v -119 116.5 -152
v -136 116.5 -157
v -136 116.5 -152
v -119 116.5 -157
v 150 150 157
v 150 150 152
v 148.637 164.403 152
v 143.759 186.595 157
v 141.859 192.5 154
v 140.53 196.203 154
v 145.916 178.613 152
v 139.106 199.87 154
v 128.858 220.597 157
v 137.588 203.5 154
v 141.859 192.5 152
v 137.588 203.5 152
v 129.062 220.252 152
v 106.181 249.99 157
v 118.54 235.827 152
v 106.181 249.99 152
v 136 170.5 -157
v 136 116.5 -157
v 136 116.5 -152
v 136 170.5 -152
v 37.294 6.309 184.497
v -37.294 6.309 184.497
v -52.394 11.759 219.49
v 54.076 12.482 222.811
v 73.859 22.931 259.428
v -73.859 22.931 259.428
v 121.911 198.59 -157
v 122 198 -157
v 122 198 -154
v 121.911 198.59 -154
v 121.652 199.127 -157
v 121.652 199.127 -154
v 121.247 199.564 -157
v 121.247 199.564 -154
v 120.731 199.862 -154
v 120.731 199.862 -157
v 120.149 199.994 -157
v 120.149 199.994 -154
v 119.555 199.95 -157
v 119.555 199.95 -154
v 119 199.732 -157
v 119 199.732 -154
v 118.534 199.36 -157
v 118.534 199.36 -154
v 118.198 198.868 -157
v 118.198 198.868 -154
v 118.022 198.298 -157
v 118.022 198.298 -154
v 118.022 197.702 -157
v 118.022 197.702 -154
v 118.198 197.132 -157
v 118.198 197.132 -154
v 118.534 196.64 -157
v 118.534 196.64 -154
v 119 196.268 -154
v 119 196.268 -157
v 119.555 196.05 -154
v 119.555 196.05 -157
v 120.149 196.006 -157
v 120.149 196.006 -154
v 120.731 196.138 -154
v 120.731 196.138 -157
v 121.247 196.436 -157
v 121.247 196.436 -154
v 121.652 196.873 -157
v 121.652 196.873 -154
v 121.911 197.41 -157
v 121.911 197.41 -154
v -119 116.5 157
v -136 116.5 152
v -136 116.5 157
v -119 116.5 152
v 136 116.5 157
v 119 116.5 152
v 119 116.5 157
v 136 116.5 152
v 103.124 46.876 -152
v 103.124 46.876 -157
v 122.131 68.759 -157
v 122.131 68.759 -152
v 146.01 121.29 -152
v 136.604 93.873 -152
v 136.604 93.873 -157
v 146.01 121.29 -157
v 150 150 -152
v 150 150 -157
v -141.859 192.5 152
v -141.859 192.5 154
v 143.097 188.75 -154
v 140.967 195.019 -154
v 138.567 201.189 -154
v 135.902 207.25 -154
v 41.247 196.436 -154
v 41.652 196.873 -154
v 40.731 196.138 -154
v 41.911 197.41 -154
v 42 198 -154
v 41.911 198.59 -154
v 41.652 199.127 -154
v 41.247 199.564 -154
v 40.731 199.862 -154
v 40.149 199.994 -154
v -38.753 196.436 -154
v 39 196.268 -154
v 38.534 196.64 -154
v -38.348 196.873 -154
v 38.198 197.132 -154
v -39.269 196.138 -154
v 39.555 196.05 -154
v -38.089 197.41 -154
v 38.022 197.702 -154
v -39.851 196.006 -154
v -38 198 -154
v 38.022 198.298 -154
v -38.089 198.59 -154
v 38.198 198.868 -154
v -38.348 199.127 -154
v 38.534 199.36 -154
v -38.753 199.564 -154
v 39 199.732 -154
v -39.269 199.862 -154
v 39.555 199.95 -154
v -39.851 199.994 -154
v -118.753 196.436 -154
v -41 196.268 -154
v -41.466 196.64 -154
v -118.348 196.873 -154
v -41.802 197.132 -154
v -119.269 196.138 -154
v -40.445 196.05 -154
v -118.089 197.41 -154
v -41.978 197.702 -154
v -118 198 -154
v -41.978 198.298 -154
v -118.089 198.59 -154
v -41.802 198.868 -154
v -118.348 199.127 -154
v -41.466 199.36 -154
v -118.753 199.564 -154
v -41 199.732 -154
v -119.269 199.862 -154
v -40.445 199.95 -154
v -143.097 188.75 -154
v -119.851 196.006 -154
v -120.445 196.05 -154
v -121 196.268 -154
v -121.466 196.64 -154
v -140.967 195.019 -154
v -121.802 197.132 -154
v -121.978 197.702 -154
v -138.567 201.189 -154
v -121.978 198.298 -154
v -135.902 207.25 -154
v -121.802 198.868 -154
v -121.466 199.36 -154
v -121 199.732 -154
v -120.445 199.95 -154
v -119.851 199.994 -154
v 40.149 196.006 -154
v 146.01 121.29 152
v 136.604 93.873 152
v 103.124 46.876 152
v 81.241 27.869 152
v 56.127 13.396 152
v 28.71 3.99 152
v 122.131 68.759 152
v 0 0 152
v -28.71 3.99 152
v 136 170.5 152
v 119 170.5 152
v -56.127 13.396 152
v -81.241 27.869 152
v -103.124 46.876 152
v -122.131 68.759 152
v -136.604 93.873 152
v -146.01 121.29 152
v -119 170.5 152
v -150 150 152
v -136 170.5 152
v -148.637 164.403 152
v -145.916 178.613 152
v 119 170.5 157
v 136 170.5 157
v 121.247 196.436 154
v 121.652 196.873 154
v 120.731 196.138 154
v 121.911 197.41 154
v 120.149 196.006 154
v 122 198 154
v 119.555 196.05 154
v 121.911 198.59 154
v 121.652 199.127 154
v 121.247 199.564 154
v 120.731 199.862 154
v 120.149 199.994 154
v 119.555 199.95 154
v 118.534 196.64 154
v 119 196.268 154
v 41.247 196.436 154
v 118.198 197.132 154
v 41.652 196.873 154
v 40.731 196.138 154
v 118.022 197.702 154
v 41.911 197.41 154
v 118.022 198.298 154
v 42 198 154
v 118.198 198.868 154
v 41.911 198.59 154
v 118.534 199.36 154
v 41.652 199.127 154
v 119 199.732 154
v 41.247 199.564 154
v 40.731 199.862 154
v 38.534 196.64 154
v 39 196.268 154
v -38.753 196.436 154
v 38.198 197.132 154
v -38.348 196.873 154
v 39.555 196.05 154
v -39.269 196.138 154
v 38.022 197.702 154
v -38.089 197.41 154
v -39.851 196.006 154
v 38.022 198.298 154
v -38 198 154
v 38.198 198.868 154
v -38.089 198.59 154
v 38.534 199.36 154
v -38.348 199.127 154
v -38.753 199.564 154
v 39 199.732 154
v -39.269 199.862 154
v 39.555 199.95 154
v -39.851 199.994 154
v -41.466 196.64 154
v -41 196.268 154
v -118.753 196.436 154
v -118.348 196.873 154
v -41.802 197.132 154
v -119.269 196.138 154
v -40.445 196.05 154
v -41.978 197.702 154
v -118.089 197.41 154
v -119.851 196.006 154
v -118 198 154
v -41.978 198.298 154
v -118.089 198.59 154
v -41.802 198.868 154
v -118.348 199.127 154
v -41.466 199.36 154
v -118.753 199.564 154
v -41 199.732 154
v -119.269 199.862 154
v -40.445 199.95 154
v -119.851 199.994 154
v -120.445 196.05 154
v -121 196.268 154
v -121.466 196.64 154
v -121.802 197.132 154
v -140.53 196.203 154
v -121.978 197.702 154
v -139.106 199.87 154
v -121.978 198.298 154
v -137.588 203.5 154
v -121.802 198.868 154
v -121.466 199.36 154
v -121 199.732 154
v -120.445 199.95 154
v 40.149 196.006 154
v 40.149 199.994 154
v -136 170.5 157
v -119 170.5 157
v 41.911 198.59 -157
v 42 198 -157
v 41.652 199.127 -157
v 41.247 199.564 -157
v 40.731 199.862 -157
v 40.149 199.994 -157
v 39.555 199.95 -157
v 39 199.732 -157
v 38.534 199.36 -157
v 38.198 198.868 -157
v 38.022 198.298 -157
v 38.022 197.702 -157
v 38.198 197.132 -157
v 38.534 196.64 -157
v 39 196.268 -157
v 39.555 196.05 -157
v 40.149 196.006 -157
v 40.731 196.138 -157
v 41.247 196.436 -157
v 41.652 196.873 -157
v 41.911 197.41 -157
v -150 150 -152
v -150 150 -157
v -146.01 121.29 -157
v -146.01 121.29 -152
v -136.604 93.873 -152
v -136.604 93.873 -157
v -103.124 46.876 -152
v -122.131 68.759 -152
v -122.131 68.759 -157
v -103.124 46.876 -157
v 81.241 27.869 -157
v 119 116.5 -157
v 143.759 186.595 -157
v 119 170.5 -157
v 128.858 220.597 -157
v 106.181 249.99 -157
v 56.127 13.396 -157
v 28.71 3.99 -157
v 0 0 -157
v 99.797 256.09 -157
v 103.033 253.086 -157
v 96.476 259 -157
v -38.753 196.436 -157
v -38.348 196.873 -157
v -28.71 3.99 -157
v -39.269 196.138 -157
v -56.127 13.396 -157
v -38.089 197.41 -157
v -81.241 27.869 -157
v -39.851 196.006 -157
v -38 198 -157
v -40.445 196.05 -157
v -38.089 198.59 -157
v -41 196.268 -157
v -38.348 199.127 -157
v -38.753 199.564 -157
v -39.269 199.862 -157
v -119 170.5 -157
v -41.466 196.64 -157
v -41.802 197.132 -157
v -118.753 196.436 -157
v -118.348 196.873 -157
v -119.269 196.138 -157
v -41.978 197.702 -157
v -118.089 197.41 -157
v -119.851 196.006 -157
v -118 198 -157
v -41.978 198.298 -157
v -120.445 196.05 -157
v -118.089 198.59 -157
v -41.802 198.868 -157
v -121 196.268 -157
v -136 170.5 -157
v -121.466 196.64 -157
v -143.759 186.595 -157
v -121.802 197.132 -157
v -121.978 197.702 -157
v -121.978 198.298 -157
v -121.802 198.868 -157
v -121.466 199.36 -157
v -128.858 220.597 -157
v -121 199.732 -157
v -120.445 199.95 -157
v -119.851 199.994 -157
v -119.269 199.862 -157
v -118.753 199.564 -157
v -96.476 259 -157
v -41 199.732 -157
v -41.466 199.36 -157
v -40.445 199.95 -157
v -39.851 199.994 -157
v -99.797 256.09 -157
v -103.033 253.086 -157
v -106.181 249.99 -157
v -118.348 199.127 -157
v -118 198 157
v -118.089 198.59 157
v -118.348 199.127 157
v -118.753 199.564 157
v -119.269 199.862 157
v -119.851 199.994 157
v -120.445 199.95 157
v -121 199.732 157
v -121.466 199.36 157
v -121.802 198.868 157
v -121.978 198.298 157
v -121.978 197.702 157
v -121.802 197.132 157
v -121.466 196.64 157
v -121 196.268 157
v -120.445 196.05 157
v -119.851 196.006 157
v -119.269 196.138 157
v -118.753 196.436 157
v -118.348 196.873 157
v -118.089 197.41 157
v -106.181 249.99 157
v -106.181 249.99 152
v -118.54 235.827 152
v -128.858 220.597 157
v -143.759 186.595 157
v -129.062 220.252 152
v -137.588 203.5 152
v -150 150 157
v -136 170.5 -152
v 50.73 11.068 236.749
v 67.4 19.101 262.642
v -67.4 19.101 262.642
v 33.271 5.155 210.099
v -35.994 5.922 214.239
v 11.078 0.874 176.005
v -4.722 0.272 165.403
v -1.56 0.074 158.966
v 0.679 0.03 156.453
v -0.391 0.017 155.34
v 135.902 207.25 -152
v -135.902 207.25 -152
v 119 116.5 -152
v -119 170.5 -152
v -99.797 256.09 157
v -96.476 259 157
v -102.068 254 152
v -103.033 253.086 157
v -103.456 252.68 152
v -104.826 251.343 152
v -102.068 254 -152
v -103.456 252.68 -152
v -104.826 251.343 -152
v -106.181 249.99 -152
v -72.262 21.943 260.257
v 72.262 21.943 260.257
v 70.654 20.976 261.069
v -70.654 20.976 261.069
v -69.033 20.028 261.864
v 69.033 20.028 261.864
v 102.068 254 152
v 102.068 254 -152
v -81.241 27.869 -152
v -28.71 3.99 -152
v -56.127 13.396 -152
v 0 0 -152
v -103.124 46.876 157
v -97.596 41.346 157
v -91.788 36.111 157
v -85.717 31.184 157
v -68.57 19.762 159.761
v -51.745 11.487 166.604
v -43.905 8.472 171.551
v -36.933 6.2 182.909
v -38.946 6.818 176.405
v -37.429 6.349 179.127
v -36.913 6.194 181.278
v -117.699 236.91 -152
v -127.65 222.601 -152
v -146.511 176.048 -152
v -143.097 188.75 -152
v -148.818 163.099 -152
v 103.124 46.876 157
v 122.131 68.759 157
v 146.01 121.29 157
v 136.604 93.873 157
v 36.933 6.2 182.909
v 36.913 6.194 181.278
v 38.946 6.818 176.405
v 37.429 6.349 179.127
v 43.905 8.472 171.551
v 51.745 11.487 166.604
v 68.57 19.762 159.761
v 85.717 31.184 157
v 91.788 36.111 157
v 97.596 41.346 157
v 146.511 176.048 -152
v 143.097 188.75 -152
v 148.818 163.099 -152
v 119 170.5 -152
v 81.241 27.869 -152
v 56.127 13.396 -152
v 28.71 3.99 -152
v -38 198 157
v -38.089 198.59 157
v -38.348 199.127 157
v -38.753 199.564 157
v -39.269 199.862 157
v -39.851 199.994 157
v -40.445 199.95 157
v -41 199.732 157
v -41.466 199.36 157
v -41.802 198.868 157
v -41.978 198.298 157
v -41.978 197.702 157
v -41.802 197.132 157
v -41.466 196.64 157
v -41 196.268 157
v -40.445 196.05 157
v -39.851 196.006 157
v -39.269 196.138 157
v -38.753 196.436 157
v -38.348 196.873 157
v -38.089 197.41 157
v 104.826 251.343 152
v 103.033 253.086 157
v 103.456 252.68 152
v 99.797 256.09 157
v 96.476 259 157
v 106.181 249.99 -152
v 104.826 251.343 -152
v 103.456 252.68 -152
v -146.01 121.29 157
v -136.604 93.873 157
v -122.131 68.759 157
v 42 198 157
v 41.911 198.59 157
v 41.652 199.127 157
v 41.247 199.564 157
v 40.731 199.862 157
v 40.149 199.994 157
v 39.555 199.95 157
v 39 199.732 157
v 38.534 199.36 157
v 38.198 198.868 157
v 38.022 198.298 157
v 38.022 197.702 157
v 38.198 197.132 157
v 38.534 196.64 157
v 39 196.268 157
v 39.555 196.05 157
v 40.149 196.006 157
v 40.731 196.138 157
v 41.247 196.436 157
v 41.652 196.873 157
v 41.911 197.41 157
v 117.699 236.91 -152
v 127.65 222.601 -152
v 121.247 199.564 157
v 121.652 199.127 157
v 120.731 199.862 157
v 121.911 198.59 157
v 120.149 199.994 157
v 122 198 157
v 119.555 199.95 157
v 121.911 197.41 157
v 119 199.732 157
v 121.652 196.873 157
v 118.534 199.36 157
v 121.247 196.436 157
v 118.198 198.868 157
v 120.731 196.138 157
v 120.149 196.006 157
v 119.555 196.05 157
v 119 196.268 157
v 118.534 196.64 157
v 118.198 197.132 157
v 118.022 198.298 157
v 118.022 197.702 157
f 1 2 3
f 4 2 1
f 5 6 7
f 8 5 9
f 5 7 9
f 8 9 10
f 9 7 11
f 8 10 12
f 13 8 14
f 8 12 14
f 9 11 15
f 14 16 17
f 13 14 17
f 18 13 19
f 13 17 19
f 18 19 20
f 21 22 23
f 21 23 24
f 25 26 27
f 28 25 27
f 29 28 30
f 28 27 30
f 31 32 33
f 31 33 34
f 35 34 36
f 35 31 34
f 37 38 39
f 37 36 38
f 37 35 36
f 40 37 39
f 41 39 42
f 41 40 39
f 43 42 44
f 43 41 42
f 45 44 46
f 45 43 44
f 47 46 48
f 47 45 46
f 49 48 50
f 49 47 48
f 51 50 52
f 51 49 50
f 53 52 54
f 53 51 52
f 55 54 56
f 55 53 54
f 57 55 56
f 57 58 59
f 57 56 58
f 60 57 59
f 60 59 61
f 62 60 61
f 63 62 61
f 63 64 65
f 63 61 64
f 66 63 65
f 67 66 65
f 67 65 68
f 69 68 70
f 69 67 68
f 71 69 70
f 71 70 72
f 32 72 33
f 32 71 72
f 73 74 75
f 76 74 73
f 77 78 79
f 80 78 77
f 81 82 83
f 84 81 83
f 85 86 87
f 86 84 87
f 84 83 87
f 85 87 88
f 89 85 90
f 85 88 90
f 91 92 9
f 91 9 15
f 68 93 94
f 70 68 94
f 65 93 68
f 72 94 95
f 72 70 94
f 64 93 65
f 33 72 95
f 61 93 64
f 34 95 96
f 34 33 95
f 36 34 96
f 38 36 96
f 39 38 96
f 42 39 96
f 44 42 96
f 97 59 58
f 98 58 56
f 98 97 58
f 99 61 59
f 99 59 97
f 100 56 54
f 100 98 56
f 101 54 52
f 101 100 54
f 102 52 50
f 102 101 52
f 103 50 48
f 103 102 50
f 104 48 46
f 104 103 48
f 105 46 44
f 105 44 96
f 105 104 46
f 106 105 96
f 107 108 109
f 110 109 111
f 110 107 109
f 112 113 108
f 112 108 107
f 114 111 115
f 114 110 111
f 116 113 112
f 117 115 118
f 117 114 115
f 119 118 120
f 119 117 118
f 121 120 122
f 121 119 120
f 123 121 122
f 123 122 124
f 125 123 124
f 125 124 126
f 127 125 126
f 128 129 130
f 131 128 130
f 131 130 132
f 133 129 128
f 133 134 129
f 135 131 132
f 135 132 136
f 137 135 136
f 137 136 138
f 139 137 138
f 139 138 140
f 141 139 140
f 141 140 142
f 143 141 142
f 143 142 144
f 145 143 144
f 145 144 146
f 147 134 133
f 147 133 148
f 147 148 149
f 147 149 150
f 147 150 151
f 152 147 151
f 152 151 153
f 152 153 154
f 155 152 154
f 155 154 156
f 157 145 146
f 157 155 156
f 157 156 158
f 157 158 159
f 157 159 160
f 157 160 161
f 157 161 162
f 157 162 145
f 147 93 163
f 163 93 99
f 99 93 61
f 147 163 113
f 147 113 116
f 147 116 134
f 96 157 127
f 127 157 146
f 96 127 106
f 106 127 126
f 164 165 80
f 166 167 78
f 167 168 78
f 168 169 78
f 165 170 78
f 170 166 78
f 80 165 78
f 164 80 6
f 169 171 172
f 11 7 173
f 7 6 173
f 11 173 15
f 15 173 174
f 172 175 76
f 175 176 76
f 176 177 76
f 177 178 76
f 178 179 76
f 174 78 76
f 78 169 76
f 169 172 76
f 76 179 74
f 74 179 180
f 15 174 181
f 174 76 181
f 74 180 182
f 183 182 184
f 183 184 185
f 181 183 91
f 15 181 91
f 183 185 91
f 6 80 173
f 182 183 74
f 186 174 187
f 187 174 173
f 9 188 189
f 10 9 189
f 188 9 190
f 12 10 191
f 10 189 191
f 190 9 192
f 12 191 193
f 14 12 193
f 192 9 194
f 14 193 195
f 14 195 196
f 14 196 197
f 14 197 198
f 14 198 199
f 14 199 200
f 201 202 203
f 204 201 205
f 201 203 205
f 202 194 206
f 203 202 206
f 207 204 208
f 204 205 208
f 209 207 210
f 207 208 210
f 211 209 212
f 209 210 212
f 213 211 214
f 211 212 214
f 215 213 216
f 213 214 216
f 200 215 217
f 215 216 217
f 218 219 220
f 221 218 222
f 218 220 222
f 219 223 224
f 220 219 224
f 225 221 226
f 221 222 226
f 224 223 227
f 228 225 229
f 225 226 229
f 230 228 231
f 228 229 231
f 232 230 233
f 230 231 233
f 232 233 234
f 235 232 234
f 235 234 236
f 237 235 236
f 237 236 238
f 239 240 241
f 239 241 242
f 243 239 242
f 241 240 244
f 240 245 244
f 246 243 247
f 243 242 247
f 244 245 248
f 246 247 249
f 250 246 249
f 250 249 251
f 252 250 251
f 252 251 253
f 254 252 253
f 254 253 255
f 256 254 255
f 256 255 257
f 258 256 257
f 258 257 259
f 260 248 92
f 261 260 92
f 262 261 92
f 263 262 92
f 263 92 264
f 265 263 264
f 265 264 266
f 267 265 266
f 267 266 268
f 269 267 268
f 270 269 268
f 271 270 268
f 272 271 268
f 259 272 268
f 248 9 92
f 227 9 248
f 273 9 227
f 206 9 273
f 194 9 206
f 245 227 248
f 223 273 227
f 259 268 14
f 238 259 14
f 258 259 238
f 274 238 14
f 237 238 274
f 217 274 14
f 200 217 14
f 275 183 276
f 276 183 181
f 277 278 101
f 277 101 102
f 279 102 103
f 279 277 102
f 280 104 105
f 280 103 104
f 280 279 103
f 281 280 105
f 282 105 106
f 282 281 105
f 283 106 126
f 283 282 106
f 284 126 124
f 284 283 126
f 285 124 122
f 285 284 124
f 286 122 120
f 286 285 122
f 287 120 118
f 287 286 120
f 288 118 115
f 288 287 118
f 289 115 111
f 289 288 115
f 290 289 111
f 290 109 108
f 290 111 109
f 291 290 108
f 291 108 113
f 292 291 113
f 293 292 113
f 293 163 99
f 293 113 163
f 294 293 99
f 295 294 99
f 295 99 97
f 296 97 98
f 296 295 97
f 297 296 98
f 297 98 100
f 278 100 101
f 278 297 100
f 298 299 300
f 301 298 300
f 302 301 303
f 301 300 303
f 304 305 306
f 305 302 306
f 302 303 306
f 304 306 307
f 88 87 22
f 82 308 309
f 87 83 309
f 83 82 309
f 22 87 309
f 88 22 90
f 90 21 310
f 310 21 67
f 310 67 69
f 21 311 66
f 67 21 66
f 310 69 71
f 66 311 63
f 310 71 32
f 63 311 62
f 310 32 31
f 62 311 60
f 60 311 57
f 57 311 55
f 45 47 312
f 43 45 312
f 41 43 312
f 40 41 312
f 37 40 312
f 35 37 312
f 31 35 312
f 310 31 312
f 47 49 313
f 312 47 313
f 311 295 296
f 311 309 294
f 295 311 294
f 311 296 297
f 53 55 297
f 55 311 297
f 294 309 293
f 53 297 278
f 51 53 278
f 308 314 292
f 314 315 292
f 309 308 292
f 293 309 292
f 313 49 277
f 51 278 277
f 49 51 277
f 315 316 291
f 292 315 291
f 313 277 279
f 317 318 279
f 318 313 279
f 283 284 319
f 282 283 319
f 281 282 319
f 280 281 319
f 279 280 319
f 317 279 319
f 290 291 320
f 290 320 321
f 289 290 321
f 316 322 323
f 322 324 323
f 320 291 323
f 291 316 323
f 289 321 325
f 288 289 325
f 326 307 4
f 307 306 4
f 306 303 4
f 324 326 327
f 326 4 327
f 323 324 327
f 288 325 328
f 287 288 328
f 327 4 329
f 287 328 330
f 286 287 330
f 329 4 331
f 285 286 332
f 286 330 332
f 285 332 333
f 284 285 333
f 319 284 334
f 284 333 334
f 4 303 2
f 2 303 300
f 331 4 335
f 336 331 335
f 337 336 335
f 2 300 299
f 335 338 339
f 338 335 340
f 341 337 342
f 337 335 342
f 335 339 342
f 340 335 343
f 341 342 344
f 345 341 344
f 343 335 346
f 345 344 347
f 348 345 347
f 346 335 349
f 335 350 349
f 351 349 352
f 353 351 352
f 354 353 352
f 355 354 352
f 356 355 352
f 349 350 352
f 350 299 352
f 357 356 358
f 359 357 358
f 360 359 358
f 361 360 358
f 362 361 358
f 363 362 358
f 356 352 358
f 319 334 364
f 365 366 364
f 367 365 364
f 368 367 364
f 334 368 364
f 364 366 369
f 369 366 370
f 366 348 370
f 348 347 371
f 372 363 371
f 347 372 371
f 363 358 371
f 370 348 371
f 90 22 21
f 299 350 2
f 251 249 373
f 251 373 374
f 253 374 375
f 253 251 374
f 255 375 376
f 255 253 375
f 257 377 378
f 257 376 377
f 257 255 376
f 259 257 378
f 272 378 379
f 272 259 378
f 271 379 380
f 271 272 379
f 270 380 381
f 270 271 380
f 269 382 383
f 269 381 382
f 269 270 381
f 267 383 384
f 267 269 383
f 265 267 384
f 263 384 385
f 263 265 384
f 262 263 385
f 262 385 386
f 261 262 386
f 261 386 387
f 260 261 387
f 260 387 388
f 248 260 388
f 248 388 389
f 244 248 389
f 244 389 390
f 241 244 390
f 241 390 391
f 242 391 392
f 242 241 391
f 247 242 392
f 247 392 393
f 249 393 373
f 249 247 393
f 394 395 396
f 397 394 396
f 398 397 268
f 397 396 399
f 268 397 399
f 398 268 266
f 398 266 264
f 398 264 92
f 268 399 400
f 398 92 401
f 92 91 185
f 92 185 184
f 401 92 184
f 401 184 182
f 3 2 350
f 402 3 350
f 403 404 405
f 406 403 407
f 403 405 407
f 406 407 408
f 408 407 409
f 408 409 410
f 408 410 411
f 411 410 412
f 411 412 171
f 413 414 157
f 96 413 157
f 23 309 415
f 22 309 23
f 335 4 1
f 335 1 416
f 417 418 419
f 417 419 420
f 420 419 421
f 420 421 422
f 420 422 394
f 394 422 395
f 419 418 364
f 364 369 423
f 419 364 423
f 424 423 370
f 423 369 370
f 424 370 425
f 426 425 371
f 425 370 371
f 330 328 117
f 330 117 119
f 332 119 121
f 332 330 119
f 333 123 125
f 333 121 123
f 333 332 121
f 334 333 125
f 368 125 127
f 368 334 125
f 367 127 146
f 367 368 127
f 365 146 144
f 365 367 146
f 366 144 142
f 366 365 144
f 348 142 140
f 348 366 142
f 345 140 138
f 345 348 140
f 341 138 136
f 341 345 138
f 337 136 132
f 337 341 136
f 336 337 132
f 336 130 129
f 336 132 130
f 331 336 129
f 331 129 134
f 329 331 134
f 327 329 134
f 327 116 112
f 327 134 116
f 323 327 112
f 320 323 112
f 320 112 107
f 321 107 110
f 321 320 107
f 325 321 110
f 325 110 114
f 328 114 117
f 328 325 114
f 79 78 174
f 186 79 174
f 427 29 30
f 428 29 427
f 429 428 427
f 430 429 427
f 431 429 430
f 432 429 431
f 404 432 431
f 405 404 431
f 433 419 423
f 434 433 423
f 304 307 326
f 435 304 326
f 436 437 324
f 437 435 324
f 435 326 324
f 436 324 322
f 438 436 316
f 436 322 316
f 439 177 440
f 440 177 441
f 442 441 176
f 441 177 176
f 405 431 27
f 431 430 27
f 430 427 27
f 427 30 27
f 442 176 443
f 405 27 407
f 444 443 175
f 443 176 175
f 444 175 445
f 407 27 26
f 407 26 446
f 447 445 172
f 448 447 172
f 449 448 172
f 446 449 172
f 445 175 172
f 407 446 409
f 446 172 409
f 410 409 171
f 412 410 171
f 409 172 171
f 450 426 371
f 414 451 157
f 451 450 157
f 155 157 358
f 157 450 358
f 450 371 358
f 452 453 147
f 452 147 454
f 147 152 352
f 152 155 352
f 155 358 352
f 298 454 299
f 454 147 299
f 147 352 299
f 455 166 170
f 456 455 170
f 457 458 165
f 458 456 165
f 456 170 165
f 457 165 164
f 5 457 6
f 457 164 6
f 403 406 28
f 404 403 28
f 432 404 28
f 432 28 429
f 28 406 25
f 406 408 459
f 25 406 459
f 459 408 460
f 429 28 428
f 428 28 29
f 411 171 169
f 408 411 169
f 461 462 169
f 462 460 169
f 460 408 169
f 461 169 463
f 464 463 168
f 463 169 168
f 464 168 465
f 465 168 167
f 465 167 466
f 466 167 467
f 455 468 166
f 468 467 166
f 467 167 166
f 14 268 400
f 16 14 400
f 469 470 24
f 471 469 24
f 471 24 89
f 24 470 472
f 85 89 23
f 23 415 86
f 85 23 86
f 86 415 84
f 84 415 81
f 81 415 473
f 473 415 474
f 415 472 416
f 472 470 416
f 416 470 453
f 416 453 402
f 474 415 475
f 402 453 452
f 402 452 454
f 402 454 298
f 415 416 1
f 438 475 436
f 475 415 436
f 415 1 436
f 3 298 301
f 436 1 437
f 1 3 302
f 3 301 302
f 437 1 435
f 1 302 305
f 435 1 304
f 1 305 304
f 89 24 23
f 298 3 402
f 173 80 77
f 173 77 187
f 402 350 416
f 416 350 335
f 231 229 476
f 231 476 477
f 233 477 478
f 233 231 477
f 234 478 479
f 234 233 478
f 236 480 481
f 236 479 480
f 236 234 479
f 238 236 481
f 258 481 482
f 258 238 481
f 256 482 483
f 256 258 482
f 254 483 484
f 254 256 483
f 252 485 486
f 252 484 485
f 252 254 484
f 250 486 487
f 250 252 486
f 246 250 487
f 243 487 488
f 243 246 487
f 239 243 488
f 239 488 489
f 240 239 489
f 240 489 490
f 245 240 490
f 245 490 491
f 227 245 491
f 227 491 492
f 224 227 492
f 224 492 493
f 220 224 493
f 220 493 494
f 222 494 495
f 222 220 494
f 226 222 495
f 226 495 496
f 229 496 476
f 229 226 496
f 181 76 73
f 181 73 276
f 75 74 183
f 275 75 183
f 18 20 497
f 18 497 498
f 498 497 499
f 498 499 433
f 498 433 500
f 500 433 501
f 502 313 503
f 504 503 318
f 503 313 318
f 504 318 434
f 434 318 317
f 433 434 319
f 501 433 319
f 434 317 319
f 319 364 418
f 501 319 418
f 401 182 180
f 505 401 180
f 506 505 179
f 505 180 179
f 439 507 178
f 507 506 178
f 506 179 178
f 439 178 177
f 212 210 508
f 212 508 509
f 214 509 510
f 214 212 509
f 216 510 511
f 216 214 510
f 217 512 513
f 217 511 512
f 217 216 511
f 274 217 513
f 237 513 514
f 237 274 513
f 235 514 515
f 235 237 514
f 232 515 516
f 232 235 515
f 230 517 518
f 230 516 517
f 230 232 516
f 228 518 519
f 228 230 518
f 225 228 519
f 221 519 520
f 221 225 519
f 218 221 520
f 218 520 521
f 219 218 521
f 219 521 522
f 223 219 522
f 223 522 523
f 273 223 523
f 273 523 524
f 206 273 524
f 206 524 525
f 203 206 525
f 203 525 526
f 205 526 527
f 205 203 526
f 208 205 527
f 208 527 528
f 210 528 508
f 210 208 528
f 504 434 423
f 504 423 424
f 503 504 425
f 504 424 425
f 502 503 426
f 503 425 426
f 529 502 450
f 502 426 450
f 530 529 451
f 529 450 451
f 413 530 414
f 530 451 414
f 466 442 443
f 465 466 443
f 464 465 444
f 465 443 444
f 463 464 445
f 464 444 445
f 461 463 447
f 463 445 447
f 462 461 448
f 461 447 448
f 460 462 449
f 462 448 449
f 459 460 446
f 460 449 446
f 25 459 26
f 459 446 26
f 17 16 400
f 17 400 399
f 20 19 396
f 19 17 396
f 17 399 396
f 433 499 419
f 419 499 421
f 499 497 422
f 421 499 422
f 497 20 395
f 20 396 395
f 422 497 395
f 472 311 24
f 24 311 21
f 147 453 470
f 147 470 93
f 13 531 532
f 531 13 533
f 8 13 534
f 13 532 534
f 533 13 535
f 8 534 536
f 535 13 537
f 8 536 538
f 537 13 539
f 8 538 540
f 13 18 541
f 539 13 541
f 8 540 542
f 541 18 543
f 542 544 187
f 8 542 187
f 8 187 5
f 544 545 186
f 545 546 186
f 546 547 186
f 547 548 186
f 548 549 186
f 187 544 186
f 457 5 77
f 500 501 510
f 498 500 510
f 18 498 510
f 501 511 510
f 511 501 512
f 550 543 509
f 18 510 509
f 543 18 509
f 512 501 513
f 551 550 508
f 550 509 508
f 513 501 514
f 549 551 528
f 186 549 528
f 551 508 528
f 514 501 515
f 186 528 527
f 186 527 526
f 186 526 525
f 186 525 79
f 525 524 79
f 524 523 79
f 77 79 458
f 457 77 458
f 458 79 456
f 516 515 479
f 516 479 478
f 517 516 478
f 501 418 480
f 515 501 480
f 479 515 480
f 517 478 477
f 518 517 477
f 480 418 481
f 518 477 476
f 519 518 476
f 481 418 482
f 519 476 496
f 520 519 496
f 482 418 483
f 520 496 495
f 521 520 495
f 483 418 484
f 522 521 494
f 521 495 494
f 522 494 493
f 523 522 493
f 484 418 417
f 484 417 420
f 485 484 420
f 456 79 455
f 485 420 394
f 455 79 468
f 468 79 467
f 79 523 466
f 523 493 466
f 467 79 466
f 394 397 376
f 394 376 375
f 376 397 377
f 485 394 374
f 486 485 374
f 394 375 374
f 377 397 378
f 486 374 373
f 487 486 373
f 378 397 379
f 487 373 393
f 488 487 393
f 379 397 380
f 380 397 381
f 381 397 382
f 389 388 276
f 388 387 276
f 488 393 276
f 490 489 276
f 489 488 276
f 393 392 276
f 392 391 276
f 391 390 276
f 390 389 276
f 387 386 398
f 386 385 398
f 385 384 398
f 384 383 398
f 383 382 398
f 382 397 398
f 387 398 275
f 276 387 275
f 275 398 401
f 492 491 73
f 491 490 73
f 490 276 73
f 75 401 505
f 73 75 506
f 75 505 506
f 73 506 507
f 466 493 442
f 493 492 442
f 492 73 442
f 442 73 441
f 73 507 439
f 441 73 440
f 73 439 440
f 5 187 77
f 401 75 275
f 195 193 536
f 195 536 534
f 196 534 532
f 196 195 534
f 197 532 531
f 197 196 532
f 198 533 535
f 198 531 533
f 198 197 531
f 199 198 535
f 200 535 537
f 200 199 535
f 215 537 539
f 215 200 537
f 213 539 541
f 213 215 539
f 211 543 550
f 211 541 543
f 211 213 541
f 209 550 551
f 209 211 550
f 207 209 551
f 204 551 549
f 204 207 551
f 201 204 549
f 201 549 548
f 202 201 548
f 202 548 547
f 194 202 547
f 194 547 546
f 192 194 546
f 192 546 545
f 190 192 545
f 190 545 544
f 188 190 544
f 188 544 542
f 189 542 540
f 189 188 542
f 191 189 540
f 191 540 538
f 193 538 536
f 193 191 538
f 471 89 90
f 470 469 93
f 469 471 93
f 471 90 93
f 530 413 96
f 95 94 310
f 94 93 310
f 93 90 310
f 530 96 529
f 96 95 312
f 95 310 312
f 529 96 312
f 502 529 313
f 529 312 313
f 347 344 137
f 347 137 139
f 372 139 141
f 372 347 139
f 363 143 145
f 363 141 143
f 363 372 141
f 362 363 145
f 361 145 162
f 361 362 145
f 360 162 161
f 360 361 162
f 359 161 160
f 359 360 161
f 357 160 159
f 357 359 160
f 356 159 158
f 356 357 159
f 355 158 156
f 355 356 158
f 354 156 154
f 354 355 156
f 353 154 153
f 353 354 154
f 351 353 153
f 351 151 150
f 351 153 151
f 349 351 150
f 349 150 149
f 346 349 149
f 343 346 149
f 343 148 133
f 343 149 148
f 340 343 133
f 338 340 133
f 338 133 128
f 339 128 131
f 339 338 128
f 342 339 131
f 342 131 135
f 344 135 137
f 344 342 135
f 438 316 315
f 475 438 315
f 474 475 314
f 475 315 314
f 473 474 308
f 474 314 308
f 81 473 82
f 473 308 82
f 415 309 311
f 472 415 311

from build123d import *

# Parameters (mm, degrees)
BOSS_EXTRUDE1_DEPTH      = 150
BOSS_EXTRUDE1_DEPTH_BACK = 150
CUT_EXTRUDE1_DEPTH       = 399.19822728
CUT_EXTRUDE1_DEPTH_BACK  = 399.19822728
SKETCH2_OUTSIDE_W        = 417.444
SKETCH2_OUTSIDE_H        = 376.444
CUT_EXTRUDE2_DEPTH       = 399.198227346
CUT_EXTRUDE2_DEPTH_BACK  = 399.198227346
SKETCH3_W                = 4
SKETCH3_H                = 11
SKETCH3_H_2              = 18.5
CUT_EXTRUDE3_DEPTH       = 399.198227346
CUT_EXTRUDE3_DEPTH_BACK  = 399.198227346
SKETCH4_R                = 2
CUT_EXTRUDE4_DEPTH       = 399.198227346
CUT_EXTRUDE4_DEPTH_BACK  = 399.198227346
SKETCH6_W                = 17
SKETCH6_H                = 54


with BuildPart() as part:
    # Sketch1 → Boss-Extrude1 (new, two sides: drawn at the far end of the back side and taken through both)
    with BuildSketch(Plane(origin=(0, 0, 0), x_dir=(0, 0, -1), z_dir=(1, 0, 0)).offset(-BOSS_EXTRUDE1_DEPTH_BACK)):
        with BuildLine():
            Line((-152, 0), (-152, 254))
            Line((-152, 254), (152, 254))
            Line((152, 254), (152, 0))
            Line((152, 0), (157, 0))
            Line((157, 0), (157, 259))
            Line((157, 259), (-157, 259))
            Line((-157, 259), (-157, 31.183582697))
            ThreePointArc((-157, 31.183582697), (-165.22850184, 12.643980503), (-184.497347959, 6.308630372))
            ThreePointArc((-184.497347959, 6.308630372), (-222.45464291, 12.402261203), (-259.428077267, 22.930970935))
            Line((-259.428077267, 22.930970935), (-262.642015315, 19.100748719))
            ThreePointArc((-262.642015315, 19.100748719), (-208.13932257, 4.810245455), (-152, 0))
        make_face()
    extrude(amount=BOSS_EXTRUDE1_DEPTH + BOSS_EXTRUDE1_DEPTH_BACK)

    # Sketch2 outside → Cut-Extrude1 (cut, two sides: drawn at the far end of the back side and taken through both)
    with BuildSketch(Plane.XY.offset(-CUT_EXTRUDE1_DEPTH_BACK)):
        with Locations((0, 129.5)):
            Rectangle(SKETCH2_OUTSIDE_W, SKETCH2_OUTSIDE_H)
        with BuildLine():
            ThreePointArc((-106.180566109, 249.989548857), (-57.545132629, 283.138396945), (0, 295.5))
            ThreePointArc((0, 295.5), (57.545132629, 283.138396945), (106.180566109, 249.989548857))
            ThreePointArc((106.180566109, 249.989548857), (137.347558964, 204.051684319), (150, 150))
            ThreePointArc((150, 150), (136.604447301, 93.873050207), (103.124452968, 46.875547032))
            ThreePointArc((103.124452968, 46.875547032), (56.126949793, 13.395552699), (0, 0))
            ThreePointArc((0, 0), (-56.126949793, 13.395552699), (-103.124452968, 46.875547032))
            ThreePointArc((-103.124452968, 46.875547032), (-136.604447301, 93.873050207), (-150, 150))
            ThreePointArc((-150, 150), (-137.347558964, 204.051684319), (-106.180566109, 249.989548857))
        make_face(mode=Mode.SUBTRACT)
    extrude(amount=CUT_EXTRUDE1_DEPTH + CUT_EXTRUDE1_DEPTH_BACK, mode=Mode.SUBTRACT)

    # Sketch3 → Cut-Extrude2 (cut, two sides: drawn at the far end of the back side and taken through both)
    with BuildSketch(Plane(origin=(0, 0, 0), x_dir=(0, 0, -1), z_dir=(1, 0, 0)).offset(-CUT_EXTRUDE2_DEPTH_BACK)):
        with Locations((-152, 198)):
            Rectangle(SKETCH3_W, SKETCH3_H)
        with Locations((152, 198)):
            Rectangle(SKETCH3_W, SKETCH3_H_2)
    extrude(amount=CUT_EXTRUDE2_DEPTH + CUT_EXTRUDE2_DEPTH_BACK, mode=Mode.SUBTRACT)

    # Sketch4 → Cut-Extrude3 (cut, two sides: drawn at the far end of the back side and taken through both)
    with BuildSketch(Plane.XY.offset(-CUT_EXTRUDE3_DEPTH_BACK)):
        with Locations((-120, 198)):
            Circle(SKETCH4_R)
        with Locations((120, 198)):
            Circle(SKETCH4_R)
        with Locations((40, 198)):
            Circle(SKETCH4_R)
        with Locations((-40, 198)):
            Circle(SKETCH4_R)
    extrude(amount=CUT_EXTRUDE3_DEPTH + CUT_EXTRUDE3_DEPTH_BACK, mode=Mode.SUBTRACT)

    # Sketch6 → Cut-Extrude4 (cut, two sides: drawn at the far end of the back side and taken through both)
    with BuildSketch(Plane.XY.offset(-CUT_EXTRUDE4_DEPTH_BACK)):
        with Locations((-127.5, 143.5)):
            Rectangle(SKETCH6_W, SKETCH6_H)
        with Locations((127.5, 143.5)):
            Rectangle(SKETCH6_W, SKETCH6_H)
    extrude(amount=CUT_EXTRUDE4_DEPTH + CUT_EXTRUDE4_DEPTH_BACK, mode=Mode.SUBTRACT)


solid = part.part
